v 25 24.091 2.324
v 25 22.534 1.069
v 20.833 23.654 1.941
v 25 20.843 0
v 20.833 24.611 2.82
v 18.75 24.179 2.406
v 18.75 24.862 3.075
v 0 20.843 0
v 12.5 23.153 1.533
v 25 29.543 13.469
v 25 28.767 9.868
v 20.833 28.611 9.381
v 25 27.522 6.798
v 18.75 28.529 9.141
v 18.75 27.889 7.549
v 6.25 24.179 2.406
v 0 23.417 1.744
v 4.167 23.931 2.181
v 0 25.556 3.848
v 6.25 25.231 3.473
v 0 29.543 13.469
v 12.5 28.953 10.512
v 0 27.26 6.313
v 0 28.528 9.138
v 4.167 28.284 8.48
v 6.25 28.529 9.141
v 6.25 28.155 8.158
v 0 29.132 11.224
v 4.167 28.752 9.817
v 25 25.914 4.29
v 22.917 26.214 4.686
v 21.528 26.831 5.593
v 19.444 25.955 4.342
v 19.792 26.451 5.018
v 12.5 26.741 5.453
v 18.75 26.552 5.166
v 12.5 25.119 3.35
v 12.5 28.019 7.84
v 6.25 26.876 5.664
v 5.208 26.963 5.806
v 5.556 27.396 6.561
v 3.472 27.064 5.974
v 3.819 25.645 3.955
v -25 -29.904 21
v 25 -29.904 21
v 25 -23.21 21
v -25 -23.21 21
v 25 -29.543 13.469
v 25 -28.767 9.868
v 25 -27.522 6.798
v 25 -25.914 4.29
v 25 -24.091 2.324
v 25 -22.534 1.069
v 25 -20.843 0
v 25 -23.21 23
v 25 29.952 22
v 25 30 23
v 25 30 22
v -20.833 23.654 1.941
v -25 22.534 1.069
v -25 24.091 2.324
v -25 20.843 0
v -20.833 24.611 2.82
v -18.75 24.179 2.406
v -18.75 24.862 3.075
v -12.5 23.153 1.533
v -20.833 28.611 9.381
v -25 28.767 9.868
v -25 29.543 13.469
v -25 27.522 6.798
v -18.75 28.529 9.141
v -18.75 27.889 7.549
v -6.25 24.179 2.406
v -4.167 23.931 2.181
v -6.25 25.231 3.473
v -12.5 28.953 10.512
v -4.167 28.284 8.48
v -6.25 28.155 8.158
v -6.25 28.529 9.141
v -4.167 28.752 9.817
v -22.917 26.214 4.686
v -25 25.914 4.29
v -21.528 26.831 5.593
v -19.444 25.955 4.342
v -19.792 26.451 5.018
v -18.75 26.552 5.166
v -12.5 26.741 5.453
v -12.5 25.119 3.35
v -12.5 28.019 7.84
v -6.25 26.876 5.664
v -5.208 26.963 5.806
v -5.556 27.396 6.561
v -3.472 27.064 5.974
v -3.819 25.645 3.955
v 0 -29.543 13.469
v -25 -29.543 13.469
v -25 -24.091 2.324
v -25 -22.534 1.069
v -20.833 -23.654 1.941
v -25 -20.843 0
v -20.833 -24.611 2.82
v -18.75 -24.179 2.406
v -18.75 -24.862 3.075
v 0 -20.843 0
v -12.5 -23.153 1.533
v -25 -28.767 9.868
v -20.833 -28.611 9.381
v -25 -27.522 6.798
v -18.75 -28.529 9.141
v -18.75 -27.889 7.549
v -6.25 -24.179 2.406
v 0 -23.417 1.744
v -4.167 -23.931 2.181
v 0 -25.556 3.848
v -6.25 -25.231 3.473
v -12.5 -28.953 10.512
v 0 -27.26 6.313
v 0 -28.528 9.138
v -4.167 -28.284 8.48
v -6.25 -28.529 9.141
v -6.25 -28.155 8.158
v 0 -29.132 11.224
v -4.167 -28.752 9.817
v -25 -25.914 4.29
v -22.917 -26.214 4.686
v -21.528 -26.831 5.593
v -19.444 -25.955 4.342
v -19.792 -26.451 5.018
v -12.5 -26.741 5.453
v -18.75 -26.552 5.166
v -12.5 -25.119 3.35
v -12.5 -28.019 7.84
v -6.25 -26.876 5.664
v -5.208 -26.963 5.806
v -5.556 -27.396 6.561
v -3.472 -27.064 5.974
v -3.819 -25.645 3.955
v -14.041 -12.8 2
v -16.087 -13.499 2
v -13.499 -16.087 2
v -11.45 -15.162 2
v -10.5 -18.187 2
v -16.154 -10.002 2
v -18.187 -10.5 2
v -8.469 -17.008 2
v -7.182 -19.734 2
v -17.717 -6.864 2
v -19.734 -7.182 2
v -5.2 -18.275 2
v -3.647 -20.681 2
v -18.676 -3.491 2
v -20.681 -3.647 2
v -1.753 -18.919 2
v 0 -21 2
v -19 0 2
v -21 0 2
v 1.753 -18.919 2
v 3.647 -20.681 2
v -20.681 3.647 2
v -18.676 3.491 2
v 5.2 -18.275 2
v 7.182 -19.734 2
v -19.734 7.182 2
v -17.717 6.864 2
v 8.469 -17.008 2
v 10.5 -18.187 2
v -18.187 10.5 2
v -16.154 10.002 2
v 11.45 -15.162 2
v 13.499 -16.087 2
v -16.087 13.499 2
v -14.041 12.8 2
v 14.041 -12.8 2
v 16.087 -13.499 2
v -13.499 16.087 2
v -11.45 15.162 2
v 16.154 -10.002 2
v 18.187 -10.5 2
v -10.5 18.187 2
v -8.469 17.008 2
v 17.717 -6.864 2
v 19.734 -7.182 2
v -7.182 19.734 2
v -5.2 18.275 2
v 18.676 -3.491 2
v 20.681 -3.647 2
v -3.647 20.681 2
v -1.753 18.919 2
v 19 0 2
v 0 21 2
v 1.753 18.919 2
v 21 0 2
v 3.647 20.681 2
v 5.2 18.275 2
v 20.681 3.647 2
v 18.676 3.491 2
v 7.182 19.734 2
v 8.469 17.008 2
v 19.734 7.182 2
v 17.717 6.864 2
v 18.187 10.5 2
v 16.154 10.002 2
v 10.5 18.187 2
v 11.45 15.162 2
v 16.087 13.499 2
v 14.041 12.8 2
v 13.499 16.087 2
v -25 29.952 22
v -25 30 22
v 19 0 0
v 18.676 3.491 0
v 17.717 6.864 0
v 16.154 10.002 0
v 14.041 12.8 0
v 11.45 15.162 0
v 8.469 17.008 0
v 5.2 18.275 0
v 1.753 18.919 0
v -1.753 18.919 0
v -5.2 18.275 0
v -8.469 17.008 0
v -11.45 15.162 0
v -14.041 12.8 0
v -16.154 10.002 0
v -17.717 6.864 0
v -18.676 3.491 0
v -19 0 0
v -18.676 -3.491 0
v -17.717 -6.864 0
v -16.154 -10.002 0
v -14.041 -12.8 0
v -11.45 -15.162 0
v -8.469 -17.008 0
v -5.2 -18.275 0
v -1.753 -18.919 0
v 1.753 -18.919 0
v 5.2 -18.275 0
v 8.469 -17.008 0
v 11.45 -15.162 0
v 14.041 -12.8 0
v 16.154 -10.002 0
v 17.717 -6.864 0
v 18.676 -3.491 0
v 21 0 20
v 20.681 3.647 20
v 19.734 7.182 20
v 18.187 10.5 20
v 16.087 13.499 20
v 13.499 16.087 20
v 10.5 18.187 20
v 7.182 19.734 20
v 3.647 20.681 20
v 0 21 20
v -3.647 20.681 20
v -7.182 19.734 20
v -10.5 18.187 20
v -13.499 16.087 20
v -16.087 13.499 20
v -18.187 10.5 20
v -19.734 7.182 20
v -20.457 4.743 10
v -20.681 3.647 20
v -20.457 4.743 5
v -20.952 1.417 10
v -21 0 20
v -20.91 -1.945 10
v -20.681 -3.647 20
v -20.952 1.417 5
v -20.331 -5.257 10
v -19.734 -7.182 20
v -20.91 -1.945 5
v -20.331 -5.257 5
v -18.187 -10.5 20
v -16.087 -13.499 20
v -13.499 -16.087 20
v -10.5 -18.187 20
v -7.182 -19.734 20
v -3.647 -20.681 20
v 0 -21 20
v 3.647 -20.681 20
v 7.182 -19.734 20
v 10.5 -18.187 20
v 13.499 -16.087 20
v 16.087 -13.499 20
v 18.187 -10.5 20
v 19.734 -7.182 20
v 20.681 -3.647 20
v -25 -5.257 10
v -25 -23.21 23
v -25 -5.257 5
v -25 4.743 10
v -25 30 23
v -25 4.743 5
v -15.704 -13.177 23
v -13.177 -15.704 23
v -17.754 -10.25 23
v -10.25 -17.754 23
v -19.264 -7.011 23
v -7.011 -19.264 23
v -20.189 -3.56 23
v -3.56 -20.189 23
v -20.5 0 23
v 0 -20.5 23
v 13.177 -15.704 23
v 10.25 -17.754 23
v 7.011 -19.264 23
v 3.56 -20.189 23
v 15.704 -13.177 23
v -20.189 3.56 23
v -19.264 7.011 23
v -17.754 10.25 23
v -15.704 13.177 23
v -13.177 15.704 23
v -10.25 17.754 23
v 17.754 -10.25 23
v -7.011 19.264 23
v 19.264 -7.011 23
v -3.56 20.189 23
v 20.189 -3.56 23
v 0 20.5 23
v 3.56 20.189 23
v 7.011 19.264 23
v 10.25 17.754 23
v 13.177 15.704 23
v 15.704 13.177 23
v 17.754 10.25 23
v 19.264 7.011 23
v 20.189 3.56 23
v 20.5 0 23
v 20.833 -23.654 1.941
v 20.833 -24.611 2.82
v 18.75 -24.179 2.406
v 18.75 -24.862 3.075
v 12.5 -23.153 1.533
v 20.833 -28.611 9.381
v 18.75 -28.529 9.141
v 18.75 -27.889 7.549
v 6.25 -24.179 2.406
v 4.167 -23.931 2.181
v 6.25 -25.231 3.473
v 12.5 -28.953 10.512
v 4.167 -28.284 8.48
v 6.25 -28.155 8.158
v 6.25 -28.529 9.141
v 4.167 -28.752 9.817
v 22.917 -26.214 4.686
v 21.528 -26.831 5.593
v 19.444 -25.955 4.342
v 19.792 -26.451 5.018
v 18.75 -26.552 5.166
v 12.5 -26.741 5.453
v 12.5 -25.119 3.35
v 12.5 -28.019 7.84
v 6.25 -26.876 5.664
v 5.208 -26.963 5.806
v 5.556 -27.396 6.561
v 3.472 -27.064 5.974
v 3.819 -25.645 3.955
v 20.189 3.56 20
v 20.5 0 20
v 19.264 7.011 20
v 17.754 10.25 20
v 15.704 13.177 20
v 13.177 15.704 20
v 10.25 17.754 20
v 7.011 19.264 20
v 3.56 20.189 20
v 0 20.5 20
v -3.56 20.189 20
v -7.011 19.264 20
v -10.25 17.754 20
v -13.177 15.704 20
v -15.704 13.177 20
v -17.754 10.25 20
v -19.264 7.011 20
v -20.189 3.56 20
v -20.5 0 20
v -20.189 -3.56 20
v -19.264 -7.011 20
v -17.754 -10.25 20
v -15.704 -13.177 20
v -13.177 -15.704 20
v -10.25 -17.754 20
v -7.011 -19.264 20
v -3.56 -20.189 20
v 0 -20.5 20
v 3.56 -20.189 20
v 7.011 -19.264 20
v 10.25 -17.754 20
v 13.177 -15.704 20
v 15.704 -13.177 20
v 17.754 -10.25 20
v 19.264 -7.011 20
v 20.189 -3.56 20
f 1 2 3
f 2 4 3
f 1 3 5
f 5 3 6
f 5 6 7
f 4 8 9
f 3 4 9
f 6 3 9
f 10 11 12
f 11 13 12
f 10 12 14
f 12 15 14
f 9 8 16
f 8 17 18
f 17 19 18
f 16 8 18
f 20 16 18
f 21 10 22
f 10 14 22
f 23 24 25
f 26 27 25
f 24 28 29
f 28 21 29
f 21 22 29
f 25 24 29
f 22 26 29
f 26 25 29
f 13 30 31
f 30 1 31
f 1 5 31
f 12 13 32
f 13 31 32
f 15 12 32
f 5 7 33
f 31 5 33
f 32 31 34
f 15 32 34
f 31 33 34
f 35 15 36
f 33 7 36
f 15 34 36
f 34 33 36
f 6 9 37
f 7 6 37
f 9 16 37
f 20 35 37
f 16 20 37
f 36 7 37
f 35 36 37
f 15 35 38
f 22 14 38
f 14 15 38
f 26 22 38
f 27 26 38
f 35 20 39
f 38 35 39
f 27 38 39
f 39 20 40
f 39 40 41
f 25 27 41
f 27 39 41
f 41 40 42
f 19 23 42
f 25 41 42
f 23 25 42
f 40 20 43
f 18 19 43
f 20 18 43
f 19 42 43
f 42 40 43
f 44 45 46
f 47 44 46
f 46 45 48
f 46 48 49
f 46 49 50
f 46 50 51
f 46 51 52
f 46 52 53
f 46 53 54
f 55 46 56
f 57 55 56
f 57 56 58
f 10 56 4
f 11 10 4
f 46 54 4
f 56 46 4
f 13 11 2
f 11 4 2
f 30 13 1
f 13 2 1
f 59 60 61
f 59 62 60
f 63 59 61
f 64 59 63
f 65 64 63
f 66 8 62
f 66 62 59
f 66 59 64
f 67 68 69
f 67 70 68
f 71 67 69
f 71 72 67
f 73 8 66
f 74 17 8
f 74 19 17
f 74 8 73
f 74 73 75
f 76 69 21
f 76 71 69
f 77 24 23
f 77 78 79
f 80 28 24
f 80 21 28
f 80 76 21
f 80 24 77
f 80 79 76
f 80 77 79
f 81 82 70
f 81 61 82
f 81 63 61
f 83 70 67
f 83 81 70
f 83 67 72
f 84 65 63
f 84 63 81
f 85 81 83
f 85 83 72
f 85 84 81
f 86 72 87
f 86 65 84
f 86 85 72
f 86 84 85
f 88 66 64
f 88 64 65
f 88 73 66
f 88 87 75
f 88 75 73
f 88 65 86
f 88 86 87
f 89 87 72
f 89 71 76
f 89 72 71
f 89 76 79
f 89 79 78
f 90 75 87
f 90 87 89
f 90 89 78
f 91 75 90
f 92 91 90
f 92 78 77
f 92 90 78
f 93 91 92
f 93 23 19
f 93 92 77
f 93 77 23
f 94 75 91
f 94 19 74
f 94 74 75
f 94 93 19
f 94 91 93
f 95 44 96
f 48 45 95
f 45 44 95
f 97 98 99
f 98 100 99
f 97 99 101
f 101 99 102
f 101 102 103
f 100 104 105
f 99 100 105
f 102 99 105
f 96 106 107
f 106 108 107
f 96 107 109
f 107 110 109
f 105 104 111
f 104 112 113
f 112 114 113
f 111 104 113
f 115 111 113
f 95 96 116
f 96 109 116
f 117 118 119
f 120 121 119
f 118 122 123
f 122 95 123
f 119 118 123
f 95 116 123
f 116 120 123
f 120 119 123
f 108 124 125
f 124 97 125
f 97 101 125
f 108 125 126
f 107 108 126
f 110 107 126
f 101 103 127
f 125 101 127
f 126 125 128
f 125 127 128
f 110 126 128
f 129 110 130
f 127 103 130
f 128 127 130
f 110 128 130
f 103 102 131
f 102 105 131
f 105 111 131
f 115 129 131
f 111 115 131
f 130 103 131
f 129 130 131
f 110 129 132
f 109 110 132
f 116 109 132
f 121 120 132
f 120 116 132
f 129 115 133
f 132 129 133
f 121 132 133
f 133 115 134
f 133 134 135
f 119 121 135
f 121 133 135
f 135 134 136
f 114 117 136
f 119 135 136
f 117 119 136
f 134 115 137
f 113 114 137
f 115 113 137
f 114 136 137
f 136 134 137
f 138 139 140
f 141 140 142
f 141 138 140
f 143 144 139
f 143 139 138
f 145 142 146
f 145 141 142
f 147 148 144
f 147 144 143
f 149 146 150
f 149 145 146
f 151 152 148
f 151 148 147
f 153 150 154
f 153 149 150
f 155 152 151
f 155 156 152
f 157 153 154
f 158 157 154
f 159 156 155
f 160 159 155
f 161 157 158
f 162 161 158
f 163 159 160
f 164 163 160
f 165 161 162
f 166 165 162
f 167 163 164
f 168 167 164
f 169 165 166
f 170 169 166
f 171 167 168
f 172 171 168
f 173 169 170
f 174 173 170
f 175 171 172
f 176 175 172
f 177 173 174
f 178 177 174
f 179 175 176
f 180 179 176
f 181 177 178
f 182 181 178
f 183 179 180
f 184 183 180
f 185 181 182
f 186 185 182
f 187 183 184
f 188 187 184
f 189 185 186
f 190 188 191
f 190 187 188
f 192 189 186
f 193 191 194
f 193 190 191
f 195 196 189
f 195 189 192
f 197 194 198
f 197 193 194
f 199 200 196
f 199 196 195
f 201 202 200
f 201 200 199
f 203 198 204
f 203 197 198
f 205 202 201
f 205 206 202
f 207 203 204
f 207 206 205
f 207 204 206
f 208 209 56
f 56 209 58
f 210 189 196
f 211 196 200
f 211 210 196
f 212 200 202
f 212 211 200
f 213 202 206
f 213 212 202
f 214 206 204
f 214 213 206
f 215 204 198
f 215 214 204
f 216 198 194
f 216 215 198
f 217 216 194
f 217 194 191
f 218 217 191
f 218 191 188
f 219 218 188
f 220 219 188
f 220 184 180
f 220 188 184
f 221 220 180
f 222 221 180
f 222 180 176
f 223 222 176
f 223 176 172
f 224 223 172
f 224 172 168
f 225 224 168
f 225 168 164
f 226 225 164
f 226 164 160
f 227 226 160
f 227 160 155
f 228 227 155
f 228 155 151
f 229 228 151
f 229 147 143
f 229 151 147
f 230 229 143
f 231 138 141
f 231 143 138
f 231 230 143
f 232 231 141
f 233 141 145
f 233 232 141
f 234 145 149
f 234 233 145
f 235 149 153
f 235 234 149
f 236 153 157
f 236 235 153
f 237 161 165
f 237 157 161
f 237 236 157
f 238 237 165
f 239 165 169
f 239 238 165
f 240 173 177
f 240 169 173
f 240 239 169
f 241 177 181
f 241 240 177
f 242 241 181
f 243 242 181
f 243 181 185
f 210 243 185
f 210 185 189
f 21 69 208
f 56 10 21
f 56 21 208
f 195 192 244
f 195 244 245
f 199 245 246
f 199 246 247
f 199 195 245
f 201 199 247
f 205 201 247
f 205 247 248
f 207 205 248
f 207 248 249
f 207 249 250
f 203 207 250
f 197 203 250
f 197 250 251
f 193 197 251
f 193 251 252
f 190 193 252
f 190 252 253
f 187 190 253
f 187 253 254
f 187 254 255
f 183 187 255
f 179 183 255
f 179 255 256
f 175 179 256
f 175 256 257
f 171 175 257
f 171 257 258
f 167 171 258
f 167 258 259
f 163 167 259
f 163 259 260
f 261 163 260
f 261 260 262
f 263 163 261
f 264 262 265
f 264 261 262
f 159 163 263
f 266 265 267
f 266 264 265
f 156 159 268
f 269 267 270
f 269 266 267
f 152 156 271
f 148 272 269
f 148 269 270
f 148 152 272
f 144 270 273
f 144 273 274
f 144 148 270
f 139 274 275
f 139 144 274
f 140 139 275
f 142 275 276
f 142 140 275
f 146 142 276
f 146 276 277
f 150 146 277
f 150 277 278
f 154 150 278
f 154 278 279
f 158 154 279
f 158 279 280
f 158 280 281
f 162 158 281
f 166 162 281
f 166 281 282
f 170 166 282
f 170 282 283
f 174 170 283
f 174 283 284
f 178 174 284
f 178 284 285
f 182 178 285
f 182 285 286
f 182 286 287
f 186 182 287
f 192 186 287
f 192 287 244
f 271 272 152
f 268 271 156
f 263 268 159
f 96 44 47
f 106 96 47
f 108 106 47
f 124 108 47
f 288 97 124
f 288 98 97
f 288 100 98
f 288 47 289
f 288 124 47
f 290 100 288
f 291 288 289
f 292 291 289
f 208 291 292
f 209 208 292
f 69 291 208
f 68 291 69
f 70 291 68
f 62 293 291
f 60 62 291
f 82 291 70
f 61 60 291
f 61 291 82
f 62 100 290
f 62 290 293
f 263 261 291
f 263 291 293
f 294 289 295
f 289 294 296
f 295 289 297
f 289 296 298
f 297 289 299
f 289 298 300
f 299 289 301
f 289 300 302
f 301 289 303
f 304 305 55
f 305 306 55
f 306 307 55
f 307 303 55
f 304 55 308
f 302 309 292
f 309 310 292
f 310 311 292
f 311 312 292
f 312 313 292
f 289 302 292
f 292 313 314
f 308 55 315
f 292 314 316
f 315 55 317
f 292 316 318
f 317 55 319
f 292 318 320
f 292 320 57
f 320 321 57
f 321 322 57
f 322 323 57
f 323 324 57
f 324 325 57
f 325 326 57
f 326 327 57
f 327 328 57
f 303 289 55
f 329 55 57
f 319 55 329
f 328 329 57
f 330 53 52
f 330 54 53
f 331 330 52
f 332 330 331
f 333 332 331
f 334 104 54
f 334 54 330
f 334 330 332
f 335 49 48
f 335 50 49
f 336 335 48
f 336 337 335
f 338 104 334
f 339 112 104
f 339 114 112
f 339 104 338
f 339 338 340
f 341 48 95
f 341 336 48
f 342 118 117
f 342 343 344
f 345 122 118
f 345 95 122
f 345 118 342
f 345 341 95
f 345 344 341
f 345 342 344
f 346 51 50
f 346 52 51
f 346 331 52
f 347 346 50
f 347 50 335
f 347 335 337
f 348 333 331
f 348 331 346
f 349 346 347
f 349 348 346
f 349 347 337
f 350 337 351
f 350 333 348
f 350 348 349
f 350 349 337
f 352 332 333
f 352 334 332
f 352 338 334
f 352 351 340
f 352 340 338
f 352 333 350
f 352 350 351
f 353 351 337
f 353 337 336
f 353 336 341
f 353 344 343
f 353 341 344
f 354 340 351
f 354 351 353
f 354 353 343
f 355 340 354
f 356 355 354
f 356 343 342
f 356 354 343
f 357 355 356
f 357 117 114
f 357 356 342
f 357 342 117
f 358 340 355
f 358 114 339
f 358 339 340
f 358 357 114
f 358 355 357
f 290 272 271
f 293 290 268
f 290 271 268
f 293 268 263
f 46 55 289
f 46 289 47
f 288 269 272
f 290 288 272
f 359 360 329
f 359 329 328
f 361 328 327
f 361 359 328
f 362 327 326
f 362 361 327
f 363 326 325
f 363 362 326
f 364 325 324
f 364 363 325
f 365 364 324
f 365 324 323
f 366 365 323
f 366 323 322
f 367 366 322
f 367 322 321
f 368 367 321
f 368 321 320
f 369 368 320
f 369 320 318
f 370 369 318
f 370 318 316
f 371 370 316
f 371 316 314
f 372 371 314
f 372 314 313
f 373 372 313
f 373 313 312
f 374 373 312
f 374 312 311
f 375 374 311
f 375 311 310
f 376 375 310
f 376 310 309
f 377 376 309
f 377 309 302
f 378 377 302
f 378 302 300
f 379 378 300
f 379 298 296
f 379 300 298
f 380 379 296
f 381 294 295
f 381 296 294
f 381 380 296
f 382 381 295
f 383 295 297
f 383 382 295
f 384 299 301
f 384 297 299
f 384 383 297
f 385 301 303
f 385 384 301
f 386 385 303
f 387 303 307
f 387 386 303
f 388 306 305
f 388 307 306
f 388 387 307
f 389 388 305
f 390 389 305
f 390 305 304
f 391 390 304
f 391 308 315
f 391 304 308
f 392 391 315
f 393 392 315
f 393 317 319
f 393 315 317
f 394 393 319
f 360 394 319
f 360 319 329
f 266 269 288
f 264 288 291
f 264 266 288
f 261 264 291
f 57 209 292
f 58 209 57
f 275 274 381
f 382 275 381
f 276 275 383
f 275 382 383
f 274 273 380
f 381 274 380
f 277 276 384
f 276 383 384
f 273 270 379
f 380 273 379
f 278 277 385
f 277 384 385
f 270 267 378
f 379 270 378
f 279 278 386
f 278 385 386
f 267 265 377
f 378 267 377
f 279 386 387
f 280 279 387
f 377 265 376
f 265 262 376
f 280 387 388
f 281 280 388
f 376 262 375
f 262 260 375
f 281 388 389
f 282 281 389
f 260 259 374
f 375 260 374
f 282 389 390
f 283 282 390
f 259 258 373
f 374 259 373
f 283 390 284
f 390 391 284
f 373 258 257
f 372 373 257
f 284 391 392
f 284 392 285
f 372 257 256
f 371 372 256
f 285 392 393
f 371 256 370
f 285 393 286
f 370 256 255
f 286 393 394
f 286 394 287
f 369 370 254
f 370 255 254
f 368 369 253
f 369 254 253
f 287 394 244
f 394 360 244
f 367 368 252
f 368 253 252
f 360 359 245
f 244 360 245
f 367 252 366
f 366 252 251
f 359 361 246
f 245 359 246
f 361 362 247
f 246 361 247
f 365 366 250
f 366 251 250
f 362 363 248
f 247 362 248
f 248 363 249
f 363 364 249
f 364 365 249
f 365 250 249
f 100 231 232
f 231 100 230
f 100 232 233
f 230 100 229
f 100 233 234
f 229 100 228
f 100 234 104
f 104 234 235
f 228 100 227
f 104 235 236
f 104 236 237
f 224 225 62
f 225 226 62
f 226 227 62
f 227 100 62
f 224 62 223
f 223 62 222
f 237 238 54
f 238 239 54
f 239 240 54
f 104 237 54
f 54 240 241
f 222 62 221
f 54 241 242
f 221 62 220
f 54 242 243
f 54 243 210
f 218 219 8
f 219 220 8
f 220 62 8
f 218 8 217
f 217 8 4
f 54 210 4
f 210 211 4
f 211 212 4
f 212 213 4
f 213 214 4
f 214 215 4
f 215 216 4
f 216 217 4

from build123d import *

# Parameters (mm, degrees)
SKETCH2_R                = 21
SKETCH2_R_2              = 18
BOSS_EXTRUDE1_DEPTH      = 2
SKETCH3_R                = 23
SKETCH3_R_2              = 21
BOSS_EXTRUDE2_DEPTH      = 20
BOSS_EXTRUDE4_START      = 20
SKETCH5_W                = 50
SKETCH5_H                = 60
BOSS_EXTRUDE4_DEPTH      = 3
CUT_EXTRUDE5_START       = 20
SKETCH6_R                = 22
CUT_EXTRUDE5_DEPTH       = 5
BOSS_EXTRUDE5_START      = 20
SKETCH7_R                = 22
SKETCH7_R_2              = 20.5
BOSS_EXTRUDE5_DEPTH      = 3
SKETCH11_W               = 50
SKETCH11_H               = 60
SKETCH11_R               = 23
BOSS_EXTRUDE13_DEPTH     = 20
CUT_EXTRUDE8_DEPTH       = 26
CUT_EXTRUDE8_DEPTH_BACK  = 26
SKETCH14_W               = 5
SKETCH14_H               = 10
CUT_EXTRUDE9_DEPTH       = 30
BOSS_EXTRUDE14_START     = 22
SKETCH16_W               = 50
SKETCH16_H               = 53.9
SKETCH16_R               = 21
BOSS_EXTRUDE14_DEPTH     = 5
CUT_EXTRUDE10_DEPTH      = 26.0000001
CUT_EXTRUDE10_DEPTH_BACK = 26.0000001
SKETCH18_W               = 2
SKETCH18_H               = 6.789744693
CUT_EXTRUDE11_DEPTH      = 26.0000001
CUT_EXTRUDE11_DEPTH_BACK = 26.0000001
SKETCH19_R               = 19
SKETCH19_R_2             = 18
CUT_EXTRUDE13_DEPTH      = 24.0000001
CUT_EXTRUDE13_DEPTH_BACK = 1.0000001


with BuildPart() as part:
    # Sketch2 → Boss-Extrude1 (new body)
    with BuildSketch(Plane.XY):
        Circle(SKETCH2_R)
        Circle(SKETCH2_R_2, mode=Mode.SUBTRACT)
    extrude(amount=BOSS_EXTRUDE1_DEPTH)

    # Sketch3 → Boss-Extrude2 (add)
    with BuildSketch(Plane.XY):
        Circle(SKETCH3_R)
        Circle(SKETCH3_R_2, mode=Mode.SUBTRACT)
    extrude(amount=BOSS_EXTRUDE2_DEPTH)

    # Sketch5 → Boss-Extrude4 (add)
    with BuildSketch(Plane.XY.offset(BOSS_EXTRUDE4_START)):
        Rectangle(SKETCH5_W, SKETCH5_H)
    extrude(amount=BOSS_EXTRUDE4_DEPTH)

    # Sketch6 → Cut-Extrude5 (cut)
    with BuildSketch(Plane.XY.offset(CUT_EXTRUDE5_START)):
        Circle(SKETCH6_R)
    extrude(amount=CUT_EXTRUDE5_DEPTH, mode=Mode.SUBTRACT)

    # Sketch7 → Boss-Extrude5 (add)
    with BuildSketch(Plane.XY.offset(BOSS_EXTRUDE5_START)):
        Circle(SKETCH7_R)
        Circle(SKETCH7_R_2, mode=Mode.SUBTRACT)
    extrude(amount=BOSS_EXTRUDE5_DEPTH)

    # Sketch11 → Boss-Extrude13 (add)
    with BuildSketch(Plane.XY):
        Rectangle(SKETCH11_W, SKETCH11_H)
        Circle(SKETCH11_R, mode=Mode.SUBTRACT)
    extrude(amount=BOSS_EXTRUDE13_DEPTH)

    # Sketch13 → Cut-Extrude8 (cut, two sides)
    with BuildSketch(Plane(origin=(0, 0, 0), x_dir=(0, 0, -1), z_dir=(1, 0, 0))) as cut_extrude8_sk:
        with BuildLine():
            Line((-13.469410681, 29.542799808), (-23, 30))
            Line((-23, 30), (-23, 33.892869883))
            Line((-23, 33.892869883), (0, 33.892869883))
            Line((0, 33.892869883), (0, 20.84319904))
            add(Edge.make_bspline(
                [(0, 20.84319904), (-4.171009324, 28.289688325), (-13.469410681, 29.542799808)],
                knots=[0, 0, 0, 1, 1, 1], degree=2))
        make_face()
        with BuildLine():
            Line((-23, -33.892869883), (-23, -30))
            Line((-23, -30), (-13.469410681, -29.542799808))
            add(Edge.make_bspline(
                [(0, -20.84319904), (-4.171009324, -28.289688325), (-13.469410681, -29.542799808)],
                knots=[0, 0, 0, 1, 1, 1], degree=2))
            Line((0, -20.84319904), (0, -33.892869883))
            Line((0, -33.892869883), (-23, -33.892869883))
        make_face()
    extrude(amount=CUT_EXTRUDE8_DEPTH, mode=Mode.SUBTRACT)
    extrude(cut_extrude8_sk.sketch, amount=-CUT_EXTRUDE8_DEPTH_BACK, mode=Mode.SUBTRACT)

    # Sketch14 → Cut-Extrude9 (cut)
    with BuildSketch(Plane(origin=(0, 0, 0), x_dir=(0, 0, -1), z_dir=(1, 0, 0))):
        with Locations((-7.5, -0.257473708)):
            Rectangle(SKETCH14_W, SKETCH14_H)
    extrude(amount=-CUT_EXTRUDE9_DEPTH, mode=Mode.SUBTRACT)

    # Sketch16 → Boss-Extrude14 (add)
    with BuildSketch(Plane.XY.offset(BOSS_EXTRUDE14_START)):
        with Locations((0, 3.05)):
            Rectangle(SKETCH16_W, SKETCH16_H)
        Circle(SKETCH16_R, mode=Mode.SUBTRACT)
    extrude(amount=BOSS_EXTRUDE14_DEPTH)

    # Sketch17 → Cut-Extrude10 (cut, two sides)
    with BuildSketch(Plane(origin=(0, 0, 0), x_dir=(0, 0, -1), z_dir=(1, 0, 0))) as cut_extrude10_sk:
        Polygon((-23, -23.9), (-23, 0), (-23, 35.597390388), (-27, 35.597390388), (-27, -23.9), align=None)
    extrude(amount=CUT_EXTRUDE10_DEPTH, mode=Mode.SUBTRACT)
    extrude(cut_extrude10_sk.sketch, amount=-CUT_EXTRUDE10_DEPTH_BACK, mode=Mode.SUBTRACT)

    # Sketch18 → Cut-Extrude11 (cut, two sides)
    with BuildSketch(Plane(origin=(0, 0, 0), x_dir=(0, 0, -1), z_dir=(1, 0, 0))) as cut_extrude11_sk:
        with Locations((-22, -26.605127654)):
            Rectangle(SKETCH18_W, SKETCH18_H)
    extrude(amount=CUT_EXTRUDE11_DEPTH, mode=Mode.SUBTRACT)
    extrude(cut_extrude11_sk.sketch, amount=-CUT_EXTRUDE11_DEPTH_BACK, mode=Mode.SUBTRACT)

    # Sketch19 → Cut-Extrude13 (cut, two sides)
    with BuildSketch(Plane.XY) as cut_extrude13_sk:
        Circle(SKETCH19_R)
        Circle(SKETCH19_R_2, mode=Mode.SUBTRACT)
    extrude(amount=CUT_EXTRUDE13_DEPTH, mode=Mode.SUBTRACT)
    extrude(cut_extrude13_sk.sketch, amount=-CUT_EXTRUDE13_DEPTH_BACK, mode=Mode.SUBTRACT)


solid = part.part
